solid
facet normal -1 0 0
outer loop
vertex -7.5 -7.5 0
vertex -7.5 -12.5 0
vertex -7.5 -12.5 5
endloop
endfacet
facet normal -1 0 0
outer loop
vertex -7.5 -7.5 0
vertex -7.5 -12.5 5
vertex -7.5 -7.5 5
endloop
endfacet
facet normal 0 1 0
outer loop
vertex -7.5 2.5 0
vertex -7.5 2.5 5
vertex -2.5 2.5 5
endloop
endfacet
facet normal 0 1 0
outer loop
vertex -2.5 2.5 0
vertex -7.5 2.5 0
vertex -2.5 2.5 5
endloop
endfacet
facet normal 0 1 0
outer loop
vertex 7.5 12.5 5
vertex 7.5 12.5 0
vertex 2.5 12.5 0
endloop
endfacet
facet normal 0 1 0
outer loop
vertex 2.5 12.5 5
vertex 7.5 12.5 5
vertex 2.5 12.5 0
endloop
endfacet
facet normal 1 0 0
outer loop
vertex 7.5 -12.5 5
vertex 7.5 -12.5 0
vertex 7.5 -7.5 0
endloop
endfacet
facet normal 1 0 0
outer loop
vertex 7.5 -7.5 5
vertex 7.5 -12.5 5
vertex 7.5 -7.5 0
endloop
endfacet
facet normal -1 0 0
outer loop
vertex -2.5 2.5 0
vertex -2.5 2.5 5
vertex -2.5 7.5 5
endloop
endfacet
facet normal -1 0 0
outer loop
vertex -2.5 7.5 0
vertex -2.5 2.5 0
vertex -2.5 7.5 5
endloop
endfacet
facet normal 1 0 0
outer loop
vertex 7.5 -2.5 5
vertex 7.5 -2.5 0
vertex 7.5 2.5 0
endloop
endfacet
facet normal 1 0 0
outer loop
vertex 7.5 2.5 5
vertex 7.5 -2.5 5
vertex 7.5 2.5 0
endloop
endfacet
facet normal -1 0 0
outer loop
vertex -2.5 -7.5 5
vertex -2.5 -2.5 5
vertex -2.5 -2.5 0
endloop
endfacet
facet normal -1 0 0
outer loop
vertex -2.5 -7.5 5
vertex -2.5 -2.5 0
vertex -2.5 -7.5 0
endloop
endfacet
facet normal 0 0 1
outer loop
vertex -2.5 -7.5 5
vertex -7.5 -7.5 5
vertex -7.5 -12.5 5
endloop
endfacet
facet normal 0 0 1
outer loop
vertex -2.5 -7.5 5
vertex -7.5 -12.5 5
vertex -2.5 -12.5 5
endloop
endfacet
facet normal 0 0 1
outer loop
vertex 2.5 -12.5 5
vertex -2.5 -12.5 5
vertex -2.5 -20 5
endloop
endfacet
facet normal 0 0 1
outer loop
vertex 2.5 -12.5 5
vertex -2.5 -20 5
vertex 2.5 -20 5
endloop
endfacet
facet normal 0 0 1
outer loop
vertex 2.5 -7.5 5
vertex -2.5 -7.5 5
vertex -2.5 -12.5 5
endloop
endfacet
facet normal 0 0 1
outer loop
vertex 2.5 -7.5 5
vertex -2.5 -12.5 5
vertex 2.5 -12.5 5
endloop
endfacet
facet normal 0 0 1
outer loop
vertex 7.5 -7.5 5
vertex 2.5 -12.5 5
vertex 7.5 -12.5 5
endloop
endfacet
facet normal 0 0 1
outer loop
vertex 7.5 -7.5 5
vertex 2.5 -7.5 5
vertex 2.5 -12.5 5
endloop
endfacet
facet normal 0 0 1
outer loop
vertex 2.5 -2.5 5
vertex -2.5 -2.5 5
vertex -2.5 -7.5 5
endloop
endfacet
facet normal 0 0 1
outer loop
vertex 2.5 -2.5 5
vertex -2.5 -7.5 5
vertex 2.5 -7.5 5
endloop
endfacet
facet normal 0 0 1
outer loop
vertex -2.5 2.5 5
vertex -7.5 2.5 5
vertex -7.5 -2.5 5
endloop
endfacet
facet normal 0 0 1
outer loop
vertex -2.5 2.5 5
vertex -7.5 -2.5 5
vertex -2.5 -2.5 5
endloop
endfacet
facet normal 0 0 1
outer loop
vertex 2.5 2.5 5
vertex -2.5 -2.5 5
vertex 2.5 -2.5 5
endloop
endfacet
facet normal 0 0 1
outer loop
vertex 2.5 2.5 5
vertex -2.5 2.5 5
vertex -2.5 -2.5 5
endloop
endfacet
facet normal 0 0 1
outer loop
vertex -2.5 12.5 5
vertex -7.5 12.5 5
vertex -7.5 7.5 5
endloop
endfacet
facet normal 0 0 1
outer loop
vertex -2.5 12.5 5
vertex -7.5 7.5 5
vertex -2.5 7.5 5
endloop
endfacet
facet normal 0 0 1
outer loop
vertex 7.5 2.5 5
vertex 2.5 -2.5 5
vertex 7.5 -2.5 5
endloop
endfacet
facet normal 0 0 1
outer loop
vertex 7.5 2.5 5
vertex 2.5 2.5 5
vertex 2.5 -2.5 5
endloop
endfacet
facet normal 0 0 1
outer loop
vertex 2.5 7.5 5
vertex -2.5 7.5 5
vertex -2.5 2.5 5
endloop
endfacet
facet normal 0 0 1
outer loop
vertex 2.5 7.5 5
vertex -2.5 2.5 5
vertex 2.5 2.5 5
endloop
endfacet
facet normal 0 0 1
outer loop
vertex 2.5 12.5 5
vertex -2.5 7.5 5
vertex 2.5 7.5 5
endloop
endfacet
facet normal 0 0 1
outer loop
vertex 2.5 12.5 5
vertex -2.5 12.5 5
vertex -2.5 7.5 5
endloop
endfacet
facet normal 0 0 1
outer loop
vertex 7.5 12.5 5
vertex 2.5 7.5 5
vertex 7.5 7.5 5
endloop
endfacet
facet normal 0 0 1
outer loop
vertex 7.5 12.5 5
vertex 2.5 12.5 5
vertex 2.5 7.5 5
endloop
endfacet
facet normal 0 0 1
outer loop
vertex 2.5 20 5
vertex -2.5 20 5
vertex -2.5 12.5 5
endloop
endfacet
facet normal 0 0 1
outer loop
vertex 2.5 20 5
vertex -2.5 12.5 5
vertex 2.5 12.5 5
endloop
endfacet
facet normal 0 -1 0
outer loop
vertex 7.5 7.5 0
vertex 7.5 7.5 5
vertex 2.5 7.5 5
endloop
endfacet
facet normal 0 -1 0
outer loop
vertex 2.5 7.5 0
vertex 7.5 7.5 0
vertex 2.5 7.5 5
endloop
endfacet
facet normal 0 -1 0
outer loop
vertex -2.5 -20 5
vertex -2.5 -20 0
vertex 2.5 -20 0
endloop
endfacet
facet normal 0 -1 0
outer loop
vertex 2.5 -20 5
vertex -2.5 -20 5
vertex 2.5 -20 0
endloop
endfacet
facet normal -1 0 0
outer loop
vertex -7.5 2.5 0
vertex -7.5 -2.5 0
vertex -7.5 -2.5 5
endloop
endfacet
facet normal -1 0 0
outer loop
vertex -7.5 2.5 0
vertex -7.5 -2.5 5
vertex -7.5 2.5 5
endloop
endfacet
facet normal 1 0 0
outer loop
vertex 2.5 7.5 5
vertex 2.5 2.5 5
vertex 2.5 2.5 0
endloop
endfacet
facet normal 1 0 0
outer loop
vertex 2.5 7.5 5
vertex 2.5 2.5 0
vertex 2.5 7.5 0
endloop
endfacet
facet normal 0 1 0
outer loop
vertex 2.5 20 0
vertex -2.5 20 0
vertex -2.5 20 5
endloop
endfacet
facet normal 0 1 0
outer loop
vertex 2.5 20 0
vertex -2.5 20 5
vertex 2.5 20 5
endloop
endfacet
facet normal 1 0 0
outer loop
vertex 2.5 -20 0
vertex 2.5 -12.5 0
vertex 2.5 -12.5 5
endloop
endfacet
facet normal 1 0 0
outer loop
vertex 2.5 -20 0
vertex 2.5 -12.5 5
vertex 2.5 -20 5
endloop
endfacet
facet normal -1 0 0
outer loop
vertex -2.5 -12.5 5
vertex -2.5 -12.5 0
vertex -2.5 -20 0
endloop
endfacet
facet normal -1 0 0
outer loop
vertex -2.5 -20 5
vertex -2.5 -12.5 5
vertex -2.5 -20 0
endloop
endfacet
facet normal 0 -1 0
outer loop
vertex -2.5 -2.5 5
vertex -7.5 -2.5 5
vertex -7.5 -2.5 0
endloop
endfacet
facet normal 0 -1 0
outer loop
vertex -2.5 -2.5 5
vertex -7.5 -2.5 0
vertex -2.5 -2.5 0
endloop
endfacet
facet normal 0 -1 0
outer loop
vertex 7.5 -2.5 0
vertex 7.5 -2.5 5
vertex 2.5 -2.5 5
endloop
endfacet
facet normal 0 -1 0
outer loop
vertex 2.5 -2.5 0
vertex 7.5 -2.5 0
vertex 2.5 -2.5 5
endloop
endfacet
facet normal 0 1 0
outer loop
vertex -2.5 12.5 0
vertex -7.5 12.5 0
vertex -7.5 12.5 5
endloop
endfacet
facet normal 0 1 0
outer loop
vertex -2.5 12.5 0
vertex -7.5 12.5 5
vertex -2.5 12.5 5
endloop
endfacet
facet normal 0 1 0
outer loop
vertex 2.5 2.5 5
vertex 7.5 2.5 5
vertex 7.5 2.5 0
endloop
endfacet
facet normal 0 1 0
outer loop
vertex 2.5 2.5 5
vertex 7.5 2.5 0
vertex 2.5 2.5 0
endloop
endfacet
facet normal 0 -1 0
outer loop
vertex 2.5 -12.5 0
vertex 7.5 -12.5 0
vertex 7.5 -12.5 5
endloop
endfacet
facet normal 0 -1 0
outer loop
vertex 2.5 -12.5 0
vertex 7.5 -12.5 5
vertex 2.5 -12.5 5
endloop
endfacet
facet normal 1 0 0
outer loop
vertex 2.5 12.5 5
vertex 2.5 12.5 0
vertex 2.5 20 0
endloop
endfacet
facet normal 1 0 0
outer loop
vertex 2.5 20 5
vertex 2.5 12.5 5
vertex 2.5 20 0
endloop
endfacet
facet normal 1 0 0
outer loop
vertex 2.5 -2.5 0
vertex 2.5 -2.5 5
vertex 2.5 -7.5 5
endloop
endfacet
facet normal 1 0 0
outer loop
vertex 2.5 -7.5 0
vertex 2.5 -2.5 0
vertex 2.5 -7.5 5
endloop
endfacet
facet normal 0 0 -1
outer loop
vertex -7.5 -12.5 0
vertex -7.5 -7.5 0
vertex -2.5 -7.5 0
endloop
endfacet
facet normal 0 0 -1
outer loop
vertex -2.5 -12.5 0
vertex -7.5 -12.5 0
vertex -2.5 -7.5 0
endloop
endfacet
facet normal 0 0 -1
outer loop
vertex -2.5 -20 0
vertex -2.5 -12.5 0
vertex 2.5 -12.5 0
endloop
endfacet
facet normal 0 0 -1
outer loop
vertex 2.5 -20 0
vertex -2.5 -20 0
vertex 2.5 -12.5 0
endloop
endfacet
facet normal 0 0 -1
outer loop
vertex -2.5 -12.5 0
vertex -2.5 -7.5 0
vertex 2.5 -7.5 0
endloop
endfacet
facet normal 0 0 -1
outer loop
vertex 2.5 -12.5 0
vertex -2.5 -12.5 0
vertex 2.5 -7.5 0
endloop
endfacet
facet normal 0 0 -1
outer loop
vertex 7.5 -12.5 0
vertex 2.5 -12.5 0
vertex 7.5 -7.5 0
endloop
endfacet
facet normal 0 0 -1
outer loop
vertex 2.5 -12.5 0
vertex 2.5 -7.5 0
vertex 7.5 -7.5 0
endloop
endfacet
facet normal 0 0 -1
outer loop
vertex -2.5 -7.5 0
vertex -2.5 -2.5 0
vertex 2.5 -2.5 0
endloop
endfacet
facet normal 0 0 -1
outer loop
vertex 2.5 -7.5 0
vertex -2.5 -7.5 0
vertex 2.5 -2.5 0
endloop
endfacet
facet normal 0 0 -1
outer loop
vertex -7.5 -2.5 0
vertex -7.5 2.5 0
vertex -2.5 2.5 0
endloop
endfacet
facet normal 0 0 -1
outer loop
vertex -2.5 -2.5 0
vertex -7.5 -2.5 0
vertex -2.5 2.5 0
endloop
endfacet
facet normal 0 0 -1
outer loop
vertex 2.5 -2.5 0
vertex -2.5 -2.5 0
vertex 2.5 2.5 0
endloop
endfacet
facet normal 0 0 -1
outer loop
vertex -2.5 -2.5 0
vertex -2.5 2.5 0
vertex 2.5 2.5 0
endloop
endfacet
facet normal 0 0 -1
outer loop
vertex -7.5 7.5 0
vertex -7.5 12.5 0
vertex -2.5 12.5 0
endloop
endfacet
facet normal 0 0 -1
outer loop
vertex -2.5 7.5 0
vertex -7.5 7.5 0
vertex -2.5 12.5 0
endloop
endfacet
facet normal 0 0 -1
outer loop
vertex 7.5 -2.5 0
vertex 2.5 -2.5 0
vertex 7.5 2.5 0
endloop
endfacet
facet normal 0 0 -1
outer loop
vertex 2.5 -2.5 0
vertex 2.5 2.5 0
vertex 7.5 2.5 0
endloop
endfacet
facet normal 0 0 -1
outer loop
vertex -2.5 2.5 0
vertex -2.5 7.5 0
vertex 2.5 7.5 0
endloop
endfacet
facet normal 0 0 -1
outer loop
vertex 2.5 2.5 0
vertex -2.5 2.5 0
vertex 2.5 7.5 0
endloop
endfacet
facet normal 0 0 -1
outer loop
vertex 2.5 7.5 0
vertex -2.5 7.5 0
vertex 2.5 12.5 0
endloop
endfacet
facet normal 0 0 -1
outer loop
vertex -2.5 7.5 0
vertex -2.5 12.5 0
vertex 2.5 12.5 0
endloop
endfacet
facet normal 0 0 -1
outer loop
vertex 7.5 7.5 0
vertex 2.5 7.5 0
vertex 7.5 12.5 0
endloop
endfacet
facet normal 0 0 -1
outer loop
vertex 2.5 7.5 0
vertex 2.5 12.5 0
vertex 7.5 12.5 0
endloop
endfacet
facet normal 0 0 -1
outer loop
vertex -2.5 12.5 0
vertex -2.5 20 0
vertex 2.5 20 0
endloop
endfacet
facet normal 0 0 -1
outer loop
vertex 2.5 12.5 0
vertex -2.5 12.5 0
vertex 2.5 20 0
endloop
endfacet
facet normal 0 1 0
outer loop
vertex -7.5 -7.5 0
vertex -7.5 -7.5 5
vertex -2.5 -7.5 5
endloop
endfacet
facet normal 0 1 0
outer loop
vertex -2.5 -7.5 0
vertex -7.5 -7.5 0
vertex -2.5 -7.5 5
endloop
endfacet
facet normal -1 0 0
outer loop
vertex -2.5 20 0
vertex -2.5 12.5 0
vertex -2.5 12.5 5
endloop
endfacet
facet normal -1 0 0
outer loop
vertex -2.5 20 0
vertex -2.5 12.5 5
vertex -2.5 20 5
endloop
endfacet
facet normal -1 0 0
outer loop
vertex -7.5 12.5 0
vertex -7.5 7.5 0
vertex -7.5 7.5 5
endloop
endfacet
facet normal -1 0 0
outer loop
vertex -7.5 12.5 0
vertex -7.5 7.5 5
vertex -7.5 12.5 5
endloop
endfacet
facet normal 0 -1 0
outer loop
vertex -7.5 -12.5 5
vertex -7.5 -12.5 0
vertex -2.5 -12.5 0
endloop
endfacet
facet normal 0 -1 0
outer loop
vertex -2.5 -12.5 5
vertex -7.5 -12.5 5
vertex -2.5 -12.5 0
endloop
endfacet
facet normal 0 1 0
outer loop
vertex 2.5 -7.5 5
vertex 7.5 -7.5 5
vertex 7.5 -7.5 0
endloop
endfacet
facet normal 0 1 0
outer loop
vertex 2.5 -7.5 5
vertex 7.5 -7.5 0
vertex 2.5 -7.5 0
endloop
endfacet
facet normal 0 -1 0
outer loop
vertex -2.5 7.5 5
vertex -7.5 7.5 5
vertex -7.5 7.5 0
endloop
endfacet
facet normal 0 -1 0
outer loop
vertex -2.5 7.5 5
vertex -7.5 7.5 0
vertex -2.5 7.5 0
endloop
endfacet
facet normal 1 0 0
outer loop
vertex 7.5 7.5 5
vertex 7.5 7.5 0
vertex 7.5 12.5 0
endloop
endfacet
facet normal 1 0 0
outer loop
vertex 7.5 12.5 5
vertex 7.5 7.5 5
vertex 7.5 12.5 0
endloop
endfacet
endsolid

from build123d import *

# Parameters (mm, degrees)
ESQUISSE6_W               = 15
ESQUISSE6_H               = 40
BOSS_EXTRU_3_DEPTH        = 5
ESQUISSE7_W               = 5
ESQUISSE7_H               = 7.5
ENL_V_MAT_EXTRU_4_DEPTH   = 5
SYM_TRIE4_COPY_1_SKETCH_W = 5
SYM_TRIE4_COPY_1_SKETCH_H = 7.5
SYM_TRIE4_COPY_1_DEPTH    = 5
ESQUISSE9_W               = 5
ESQUISSE9_H               = 5
ENL_V_MAT_EXTRU_6_DEPTH   = 5
SYM_TRIE6_COPY_1_SKETCH_W = 5
SYM_TRIE6_COPY_1_SKETCH_H = 5
SYM_TRIE6_COPY_1_DEPTH    = 5


with BuildPart() as part:
    # Esquisse6 → Boss.-Extru.3 (new body)
    with BuildSketch(Plane.XY):
        Rectangle(ESQUISSE6_W, ESQUISSE6_H)
    extrude(amount=BOSS_EXTRU_3_DEPTH)

    # Esquisse7 → Enlèv. mat.-Extru.4 (cut)
    with BuildSketch(Plane.XY):
        with Locations((-5, 16.25)):
            Rectangle(ESQUISSE7_W, ESQUISSE7_H)
    enl_v_mat_extru_4 = extrude(amount=ENL_V_MAT_EXTRU_4_DEPTH, mode=Mode.SUBTRACT)

    # Symétrie3: Enlèv. mat.-Extru.4 across plane
    add(enl_v_mat_extru_4.mirror(Plane.ZX), mode=Mode.SUBTRACT)

    # Symétrie4: Enlèv. mat.-Extru.4 across plane
    add(enl_v_mat_extru_4.mirror(Plane(origin=(0, 0, 0), x_dir=(0, 0, 1), z_dir=(1, 0, 0))), mode=Mode.SUBTRACT)

    # Symétrie4 copy 1 sketch → Symétrie4 copy 1 (cut)
    with BuildSketch(Plane(origin=(0, 0, 0), x_dir=(-1, 0, 0), z_dir=(0, 0, 1))):
        with Locations((-5, 16.25)):
            Rectangle(SYM_TRIE4_COPY_1_SKETCH_W, SYM_TRIE4_COPY_1_SKETCH_H)
    extrude(amount=SYM_TRIE4_COPY_1_DEPTH, mode=Mode.SUBTRACT)

    # Esquisse9 → Enlèv. mat.-Extru.6 (cut)
    with BuildSketch(Plane.XY.offset(5)):
        with Locations((-5, 5)):
            Rectangle(ESQUISSE9_W, ESQUISSE9_H)
    enl_v_mat_extru_6 = extrude(amount=-ENL_V_MAT_EXTRU_6_DEPTH, mode=Mode.SUBTRACT)

    # Symétrie5: Enlèv. mat.-Extru.6 across plane
    add(enl_v_mat_extru_6.mirror(Plane.ZX), mode=Mode.SUBTRACT)

    # Symétrie6: Enlèv. mat.-Extru.6 across plane
    add(enl_v_mat_extru_6.mirror(Plane(origin=(0, 0, 0), x_dir=(0, 0, 1), z_dir=(1, 0, 0))), mode=Mode.SUBTRACT)

    # Symétrie6 copy 1 sketch → Symétrie6 copy 1 (cut)
    with BuildSketch(Plane(origin=(0, 0, 5), x_dir=(-1, 0, 0), z_dir=(0, 0, 1))):
        with Locations((-5, 5)):
            Rectangle(SYM_TRIE6_COPY_1_SKETCH_W, SYM_TRIE6_COPY_1_SKETCH_H)
    extrude(amount=-SYM_TRIE6_COPY_1_DEPTH, mode=Mode.SUBTRACT)


solid = part.part
